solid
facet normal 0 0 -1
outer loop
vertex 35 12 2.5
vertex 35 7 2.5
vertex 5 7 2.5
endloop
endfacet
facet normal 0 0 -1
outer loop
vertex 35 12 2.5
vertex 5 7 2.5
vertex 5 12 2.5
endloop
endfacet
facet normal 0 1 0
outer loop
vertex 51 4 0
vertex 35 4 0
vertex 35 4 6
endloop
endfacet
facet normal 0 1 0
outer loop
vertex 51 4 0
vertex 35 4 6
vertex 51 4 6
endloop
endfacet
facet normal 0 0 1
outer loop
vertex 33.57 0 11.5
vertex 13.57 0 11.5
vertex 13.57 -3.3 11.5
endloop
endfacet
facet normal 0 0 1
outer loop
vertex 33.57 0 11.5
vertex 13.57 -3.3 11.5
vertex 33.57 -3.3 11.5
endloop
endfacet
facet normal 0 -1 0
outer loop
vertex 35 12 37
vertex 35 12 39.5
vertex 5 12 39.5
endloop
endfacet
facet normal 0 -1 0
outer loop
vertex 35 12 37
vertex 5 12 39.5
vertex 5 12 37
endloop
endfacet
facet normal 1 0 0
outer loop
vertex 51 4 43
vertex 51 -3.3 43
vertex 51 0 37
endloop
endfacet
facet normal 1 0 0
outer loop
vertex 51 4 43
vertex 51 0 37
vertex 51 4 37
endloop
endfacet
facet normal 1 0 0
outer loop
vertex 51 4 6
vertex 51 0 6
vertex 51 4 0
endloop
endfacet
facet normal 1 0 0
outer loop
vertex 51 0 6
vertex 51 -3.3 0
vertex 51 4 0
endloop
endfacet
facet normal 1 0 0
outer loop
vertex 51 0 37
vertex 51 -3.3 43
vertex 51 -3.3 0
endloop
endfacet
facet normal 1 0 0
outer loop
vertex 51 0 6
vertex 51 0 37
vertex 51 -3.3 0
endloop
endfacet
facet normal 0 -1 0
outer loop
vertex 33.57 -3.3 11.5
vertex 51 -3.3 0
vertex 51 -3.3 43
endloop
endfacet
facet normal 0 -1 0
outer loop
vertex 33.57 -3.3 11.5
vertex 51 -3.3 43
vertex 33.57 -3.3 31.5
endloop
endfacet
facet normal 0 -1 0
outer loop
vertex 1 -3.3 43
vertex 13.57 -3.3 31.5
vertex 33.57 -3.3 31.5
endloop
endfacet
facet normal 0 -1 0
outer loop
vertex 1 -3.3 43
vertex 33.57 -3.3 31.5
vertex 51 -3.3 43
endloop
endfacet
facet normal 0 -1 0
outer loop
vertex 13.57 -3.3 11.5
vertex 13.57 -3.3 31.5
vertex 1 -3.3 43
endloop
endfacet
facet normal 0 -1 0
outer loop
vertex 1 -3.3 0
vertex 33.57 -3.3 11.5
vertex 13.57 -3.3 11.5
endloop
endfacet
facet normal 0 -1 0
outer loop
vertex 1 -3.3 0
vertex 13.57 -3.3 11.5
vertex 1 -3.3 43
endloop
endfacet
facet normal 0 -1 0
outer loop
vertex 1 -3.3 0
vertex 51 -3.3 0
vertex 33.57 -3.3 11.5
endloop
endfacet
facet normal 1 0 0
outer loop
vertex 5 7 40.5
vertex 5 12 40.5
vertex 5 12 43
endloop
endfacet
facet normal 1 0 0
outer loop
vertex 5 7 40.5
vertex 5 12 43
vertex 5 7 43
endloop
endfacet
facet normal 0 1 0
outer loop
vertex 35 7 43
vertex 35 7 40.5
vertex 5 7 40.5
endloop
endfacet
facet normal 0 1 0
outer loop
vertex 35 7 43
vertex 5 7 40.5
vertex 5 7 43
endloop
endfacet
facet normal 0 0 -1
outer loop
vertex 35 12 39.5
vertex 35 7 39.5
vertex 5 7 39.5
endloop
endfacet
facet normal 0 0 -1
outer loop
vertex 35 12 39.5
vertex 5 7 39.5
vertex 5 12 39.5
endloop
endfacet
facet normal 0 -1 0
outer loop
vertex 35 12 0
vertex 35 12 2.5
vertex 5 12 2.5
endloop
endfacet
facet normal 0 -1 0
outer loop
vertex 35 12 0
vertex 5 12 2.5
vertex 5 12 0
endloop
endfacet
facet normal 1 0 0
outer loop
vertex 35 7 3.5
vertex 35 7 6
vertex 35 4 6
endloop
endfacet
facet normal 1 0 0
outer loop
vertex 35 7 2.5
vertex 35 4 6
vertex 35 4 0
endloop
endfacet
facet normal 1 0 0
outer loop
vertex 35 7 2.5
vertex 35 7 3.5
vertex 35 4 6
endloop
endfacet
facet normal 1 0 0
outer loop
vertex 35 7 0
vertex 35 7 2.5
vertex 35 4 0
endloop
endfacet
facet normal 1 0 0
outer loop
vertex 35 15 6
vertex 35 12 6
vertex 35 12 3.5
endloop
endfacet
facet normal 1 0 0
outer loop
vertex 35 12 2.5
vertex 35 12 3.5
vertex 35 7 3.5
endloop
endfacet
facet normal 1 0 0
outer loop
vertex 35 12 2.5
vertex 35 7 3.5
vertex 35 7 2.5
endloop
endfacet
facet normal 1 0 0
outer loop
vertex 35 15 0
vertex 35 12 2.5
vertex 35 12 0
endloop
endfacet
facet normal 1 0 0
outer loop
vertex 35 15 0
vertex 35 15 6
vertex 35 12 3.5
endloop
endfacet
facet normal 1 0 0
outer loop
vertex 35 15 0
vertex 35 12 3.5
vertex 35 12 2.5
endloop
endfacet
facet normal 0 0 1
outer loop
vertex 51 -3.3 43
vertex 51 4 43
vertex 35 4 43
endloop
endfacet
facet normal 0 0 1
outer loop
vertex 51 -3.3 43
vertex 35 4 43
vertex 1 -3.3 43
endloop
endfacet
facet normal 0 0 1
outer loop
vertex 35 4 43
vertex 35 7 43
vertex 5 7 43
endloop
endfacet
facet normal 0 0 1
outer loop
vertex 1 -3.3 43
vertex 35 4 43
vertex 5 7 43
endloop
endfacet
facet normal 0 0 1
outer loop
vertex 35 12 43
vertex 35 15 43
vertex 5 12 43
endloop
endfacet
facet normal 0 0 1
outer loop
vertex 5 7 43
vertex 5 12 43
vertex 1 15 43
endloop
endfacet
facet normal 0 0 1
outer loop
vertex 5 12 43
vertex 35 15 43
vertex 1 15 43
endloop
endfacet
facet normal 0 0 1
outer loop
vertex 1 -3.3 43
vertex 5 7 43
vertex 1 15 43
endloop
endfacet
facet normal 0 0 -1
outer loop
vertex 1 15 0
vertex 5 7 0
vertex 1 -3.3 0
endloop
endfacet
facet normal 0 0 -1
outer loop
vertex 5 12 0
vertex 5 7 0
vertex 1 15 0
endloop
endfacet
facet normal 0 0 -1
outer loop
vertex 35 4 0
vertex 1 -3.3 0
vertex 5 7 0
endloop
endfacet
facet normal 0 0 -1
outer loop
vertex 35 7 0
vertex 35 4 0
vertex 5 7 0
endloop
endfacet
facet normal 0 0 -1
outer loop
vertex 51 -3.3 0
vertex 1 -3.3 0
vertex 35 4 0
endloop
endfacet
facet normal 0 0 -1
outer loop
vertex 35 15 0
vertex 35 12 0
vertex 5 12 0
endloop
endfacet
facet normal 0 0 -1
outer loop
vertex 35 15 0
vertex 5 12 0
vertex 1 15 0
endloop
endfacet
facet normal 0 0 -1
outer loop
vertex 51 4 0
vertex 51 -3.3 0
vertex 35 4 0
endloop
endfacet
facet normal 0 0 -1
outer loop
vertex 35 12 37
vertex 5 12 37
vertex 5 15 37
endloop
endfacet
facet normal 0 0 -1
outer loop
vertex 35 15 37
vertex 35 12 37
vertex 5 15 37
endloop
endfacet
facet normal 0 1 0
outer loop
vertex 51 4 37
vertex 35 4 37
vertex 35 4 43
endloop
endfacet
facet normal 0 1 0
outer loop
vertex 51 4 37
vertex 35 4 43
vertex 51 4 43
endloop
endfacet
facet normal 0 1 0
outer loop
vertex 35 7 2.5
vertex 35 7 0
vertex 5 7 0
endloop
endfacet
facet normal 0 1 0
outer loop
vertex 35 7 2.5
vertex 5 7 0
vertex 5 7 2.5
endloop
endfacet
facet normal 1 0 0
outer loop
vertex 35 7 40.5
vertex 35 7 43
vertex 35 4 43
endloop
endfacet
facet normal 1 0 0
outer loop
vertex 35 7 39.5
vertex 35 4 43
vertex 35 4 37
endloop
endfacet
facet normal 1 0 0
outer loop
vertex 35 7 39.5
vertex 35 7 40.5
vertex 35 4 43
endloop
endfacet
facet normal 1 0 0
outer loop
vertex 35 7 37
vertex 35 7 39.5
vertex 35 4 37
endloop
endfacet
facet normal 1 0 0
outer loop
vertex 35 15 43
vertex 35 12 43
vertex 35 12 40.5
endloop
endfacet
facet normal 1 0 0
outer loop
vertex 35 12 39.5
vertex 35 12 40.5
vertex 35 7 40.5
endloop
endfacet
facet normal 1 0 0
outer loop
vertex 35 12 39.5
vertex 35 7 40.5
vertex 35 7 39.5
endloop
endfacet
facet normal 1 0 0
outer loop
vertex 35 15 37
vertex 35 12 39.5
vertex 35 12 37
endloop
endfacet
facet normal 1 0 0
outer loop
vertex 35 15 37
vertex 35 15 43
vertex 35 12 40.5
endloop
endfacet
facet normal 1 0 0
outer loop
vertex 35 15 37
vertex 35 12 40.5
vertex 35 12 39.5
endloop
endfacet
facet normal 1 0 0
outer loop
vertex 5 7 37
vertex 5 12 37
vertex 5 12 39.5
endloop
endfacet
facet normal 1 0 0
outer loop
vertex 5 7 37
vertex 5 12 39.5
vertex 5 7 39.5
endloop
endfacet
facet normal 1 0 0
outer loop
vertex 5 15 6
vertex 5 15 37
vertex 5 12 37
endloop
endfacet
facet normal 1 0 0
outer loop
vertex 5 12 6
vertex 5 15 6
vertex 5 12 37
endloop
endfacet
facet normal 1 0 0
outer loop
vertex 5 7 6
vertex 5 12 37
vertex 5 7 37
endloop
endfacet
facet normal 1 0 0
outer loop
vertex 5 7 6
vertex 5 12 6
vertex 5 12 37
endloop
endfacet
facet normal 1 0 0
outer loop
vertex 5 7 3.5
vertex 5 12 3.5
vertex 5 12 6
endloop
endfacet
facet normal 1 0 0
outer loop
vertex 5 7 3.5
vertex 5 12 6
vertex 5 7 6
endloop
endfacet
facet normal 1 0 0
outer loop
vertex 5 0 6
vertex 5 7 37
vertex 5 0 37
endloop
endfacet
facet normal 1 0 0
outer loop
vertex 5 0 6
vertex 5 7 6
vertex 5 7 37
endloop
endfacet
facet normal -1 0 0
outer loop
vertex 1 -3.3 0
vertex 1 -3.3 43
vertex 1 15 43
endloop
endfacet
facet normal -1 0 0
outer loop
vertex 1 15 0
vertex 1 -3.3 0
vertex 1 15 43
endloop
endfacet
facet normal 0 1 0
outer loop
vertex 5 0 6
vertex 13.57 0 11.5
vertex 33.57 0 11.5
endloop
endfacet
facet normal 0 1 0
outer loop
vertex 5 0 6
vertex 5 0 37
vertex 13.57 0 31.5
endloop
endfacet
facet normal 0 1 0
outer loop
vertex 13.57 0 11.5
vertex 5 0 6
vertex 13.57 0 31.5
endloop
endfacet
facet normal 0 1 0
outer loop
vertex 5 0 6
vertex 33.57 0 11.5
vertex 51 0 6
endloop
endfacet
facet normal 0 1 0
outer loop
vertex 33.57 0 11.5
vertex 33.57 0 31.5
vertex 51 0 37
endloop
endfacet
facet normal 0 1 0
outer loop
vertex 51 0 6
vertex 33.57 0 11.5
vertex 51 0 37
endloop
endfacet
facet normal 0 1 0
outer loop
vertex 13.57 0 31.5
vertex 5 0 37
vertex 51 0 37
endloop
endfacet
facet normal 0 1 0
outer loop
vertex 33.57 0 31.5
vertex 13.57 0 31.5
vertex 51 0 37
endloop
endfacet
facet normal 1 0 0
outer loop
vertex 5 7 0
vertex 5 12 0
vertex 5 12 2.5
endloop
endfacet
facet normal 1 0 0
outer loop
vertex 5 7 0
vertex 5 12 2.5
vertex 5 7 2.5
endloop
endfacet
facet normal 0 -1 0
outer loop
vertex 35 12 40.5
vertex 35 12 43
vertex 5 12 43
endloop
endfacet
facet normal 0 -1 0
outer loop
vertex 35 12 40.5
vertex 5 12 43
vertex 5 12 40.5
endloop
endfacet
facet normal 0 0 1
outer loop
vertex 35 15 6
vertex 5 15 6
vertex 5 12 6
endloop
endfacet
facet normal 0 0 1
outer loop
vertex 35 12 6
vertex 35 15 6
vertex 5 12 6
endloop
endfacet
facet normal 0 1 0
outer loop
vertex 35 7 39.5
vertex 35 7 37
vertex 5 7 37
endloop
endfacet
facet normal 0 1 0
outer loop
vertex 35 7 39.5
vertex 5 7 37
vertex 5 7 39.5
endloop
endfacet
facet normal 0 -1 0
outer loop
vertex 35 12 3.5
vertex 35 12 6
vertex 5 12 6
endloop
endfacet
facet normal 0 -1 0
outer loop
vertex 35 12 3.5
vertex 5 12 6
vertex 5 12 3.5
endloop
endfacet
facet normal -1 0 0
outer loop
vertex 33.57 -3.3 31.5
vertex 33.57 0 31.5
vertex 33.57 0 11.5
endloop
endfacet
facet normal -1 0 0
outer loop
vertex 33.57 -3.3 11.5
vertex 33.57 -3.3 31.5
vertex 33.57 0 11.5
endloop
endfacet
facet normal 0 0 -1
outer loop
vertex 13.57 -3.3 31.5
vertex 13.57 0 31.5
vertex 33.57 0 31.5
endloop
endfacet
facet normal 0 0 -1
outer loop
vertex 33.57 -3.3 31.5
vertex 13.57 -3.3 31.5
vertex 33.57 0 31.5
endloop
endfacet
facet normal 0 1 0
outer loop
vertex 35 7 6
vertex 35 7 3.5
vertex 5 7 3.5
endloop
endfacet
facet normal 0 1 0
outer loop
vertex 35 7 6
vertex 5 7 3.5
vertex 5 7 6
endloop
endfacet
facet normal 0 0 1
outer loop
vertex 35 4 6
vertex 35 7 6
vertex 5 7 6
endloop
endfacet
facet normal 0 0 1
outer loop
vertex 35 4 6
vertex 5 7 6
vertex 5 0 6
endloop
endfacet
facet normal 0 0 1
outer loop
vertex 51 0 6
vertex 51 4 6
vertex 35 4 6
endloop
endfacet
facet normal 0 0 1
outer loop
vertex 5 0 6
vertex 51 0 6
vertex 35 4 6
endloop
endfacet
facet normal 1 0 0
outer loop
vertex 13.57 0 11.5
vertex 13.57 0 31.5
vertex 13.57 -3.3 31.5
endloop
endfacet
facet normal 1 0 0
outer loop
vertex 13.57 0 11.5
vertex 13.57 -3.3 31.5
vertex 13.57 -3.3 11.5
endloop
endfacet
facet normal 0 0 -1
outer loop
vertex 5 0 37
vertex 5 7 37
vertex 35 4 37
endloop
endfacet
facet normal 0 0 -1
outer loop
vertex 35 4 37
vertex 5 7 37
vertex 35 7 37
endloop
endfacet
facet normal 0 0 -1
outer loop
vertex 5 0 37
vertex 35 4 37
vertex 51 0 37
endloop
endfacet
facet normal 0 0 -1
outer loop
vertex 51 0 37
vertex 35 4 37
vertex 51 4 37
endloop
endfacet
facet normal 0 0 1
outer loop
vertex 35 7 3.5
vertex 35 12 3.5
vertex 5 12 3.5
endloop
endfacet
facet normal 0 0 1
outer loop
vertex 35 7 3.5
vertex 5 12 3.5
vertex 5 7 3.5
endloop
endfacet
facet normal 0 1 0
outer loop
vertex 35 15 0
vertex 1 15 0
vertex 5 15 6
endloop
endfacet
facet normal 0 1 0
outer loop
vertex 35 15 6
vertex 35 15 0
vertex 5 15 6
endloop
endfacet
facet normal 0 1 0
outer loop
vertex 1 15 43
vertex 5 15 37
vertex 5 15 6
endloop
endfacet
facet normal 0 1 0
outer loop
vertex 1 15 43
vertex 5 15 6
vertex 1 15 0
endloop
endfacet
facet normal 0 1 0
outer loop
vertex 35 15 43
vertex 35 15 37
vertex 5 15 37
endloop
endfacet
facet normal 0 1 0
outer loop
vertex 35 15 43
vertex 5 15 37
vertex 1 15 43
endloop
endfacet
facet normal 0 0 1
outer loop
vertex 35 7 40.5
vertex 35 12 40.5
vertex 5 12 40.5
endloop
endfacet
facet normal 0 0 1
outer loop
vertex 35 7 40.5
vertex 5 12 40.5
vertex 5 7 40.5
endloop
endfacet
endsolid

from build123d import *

# Parameters (mm, degrees)
BOSS_EXTRUDE1_DEPTH = 43
CUT_EXTRUDE1_START  = -6
SKETCH3_W           = 51
SKETCH3_H           = 4
CUT_EXTRUDE1_DEPTH  = 31
CUT_EXTRUDE2_REACH  = 74.18
SKETCH4_W           = 20
SKETCH4_H           = 20
BOSS_EXTRUDE2_START = -21
BOSS_EXTRUDE2_DEPTH = 30
CUT_EXTRUDE3_REACH  = 74.18
SKETCH6_W           = 5
SKETCH6_H           = 7.3


with BuildPart() as part:
    # Sketch1 → Boss-Extrude1 (new body)
    with BuildSketch(Plane.XY):
        Polygon((1, 15), (5, 15), (5, 4), (56, 4), (56, -3.3), (1, -3.3), align=None)
    extrude(amount=BOSS_EXTRUDE1_DEPTH)

    # Sketch3 → Cut-Extrude1 (cut)
    with BuildSketch(Plane.XY.offset(43).offset(CUT_EXTRUDE1_START)):
        with Locations((30.5, 2)):
            Rectangle(SKETCH3_W, SKETCH3_H)
    extrude(amount=-CUT_EXTRUDE1_DEPTH, mode=Mode.SUBTRACT)

    # Sketch4 → Cut-Extrude2 (cut, up to next)
    with BuildSketch(Plane(origin=(0, 0, 0), x_dir=(1, 0, 0), z_dir=(0, 1, 0)), mode=Mode.PRIVATE) as cut_extrude2_sk1:
        with Locations((23.57, -21.5)):
            Rectangle(SKETCH4_W, SKETCH4_H)
    cut_extrude2_tool1 = extrude(cut_extrude2_sk1.sketch, amount=-CUT_EXTRUDE2_REACH, mode=Mode.PRIVATE) & part.part
    add(cut_extrude2_tool1.solids().sort_by_distance((23.57, 0, 21.5))[0], mode=Mode.SUBTRACT)

    # Sketch5 → Boss-Extrude2 (add)
    with BuildSketch(Plane(origin=(56, 0, 0), x_dir=(0, 0, -1), z_dir=(1, 0, 0)).offset(BOSS_EXTRUDE2_START)):
        Polygon((-6, 7), (-6, 4), (0, 4), (0, 7), (-2.5, 7), (-2.5, 12), (0, 12), (0, 15), (-6, 15), (-6, 12), (-3.5, 12), (-3.5, 7), align=None)
        Polygon((-37, 4), (-37, 7), (-39.5, 7), (-39.5, 12), (-37, 12), (-37, 15), (-43, 15), (-43, 12), (-40.5, 12), (-40.5, 7), (-43, 7), (-43, 4), align=None)
    extrude(amount=-BOSS_EXTRUDE2_DEPTH)

    # Sketch6 → Cut-Extrude3 (cut, up to next)
    with BuildSketch(Plane(origin=(0, 0, 0), x_dir=(-1, 0, 0), z_dir=(0, 0, -1)), mode=Mode.PRIVATE) as cut_extrude3_sk1:
        with Locations((-53.5, 0.35)):
            Rectangle(SKETCH6_W, SKETCH6_H)
    cut_extrude3_tool1 = extrude(cut_extrude3_sk1.sketch, amount=-CUT_EXTRUDE3_REACH, mode=Mode.PRIVATE) & part.part
    add(cut_extrude3_tool1.solids().sort_by_distance((53.5, 0.35, 0))[0], mode=Mode.SUBTRACT)


solid = part.part
